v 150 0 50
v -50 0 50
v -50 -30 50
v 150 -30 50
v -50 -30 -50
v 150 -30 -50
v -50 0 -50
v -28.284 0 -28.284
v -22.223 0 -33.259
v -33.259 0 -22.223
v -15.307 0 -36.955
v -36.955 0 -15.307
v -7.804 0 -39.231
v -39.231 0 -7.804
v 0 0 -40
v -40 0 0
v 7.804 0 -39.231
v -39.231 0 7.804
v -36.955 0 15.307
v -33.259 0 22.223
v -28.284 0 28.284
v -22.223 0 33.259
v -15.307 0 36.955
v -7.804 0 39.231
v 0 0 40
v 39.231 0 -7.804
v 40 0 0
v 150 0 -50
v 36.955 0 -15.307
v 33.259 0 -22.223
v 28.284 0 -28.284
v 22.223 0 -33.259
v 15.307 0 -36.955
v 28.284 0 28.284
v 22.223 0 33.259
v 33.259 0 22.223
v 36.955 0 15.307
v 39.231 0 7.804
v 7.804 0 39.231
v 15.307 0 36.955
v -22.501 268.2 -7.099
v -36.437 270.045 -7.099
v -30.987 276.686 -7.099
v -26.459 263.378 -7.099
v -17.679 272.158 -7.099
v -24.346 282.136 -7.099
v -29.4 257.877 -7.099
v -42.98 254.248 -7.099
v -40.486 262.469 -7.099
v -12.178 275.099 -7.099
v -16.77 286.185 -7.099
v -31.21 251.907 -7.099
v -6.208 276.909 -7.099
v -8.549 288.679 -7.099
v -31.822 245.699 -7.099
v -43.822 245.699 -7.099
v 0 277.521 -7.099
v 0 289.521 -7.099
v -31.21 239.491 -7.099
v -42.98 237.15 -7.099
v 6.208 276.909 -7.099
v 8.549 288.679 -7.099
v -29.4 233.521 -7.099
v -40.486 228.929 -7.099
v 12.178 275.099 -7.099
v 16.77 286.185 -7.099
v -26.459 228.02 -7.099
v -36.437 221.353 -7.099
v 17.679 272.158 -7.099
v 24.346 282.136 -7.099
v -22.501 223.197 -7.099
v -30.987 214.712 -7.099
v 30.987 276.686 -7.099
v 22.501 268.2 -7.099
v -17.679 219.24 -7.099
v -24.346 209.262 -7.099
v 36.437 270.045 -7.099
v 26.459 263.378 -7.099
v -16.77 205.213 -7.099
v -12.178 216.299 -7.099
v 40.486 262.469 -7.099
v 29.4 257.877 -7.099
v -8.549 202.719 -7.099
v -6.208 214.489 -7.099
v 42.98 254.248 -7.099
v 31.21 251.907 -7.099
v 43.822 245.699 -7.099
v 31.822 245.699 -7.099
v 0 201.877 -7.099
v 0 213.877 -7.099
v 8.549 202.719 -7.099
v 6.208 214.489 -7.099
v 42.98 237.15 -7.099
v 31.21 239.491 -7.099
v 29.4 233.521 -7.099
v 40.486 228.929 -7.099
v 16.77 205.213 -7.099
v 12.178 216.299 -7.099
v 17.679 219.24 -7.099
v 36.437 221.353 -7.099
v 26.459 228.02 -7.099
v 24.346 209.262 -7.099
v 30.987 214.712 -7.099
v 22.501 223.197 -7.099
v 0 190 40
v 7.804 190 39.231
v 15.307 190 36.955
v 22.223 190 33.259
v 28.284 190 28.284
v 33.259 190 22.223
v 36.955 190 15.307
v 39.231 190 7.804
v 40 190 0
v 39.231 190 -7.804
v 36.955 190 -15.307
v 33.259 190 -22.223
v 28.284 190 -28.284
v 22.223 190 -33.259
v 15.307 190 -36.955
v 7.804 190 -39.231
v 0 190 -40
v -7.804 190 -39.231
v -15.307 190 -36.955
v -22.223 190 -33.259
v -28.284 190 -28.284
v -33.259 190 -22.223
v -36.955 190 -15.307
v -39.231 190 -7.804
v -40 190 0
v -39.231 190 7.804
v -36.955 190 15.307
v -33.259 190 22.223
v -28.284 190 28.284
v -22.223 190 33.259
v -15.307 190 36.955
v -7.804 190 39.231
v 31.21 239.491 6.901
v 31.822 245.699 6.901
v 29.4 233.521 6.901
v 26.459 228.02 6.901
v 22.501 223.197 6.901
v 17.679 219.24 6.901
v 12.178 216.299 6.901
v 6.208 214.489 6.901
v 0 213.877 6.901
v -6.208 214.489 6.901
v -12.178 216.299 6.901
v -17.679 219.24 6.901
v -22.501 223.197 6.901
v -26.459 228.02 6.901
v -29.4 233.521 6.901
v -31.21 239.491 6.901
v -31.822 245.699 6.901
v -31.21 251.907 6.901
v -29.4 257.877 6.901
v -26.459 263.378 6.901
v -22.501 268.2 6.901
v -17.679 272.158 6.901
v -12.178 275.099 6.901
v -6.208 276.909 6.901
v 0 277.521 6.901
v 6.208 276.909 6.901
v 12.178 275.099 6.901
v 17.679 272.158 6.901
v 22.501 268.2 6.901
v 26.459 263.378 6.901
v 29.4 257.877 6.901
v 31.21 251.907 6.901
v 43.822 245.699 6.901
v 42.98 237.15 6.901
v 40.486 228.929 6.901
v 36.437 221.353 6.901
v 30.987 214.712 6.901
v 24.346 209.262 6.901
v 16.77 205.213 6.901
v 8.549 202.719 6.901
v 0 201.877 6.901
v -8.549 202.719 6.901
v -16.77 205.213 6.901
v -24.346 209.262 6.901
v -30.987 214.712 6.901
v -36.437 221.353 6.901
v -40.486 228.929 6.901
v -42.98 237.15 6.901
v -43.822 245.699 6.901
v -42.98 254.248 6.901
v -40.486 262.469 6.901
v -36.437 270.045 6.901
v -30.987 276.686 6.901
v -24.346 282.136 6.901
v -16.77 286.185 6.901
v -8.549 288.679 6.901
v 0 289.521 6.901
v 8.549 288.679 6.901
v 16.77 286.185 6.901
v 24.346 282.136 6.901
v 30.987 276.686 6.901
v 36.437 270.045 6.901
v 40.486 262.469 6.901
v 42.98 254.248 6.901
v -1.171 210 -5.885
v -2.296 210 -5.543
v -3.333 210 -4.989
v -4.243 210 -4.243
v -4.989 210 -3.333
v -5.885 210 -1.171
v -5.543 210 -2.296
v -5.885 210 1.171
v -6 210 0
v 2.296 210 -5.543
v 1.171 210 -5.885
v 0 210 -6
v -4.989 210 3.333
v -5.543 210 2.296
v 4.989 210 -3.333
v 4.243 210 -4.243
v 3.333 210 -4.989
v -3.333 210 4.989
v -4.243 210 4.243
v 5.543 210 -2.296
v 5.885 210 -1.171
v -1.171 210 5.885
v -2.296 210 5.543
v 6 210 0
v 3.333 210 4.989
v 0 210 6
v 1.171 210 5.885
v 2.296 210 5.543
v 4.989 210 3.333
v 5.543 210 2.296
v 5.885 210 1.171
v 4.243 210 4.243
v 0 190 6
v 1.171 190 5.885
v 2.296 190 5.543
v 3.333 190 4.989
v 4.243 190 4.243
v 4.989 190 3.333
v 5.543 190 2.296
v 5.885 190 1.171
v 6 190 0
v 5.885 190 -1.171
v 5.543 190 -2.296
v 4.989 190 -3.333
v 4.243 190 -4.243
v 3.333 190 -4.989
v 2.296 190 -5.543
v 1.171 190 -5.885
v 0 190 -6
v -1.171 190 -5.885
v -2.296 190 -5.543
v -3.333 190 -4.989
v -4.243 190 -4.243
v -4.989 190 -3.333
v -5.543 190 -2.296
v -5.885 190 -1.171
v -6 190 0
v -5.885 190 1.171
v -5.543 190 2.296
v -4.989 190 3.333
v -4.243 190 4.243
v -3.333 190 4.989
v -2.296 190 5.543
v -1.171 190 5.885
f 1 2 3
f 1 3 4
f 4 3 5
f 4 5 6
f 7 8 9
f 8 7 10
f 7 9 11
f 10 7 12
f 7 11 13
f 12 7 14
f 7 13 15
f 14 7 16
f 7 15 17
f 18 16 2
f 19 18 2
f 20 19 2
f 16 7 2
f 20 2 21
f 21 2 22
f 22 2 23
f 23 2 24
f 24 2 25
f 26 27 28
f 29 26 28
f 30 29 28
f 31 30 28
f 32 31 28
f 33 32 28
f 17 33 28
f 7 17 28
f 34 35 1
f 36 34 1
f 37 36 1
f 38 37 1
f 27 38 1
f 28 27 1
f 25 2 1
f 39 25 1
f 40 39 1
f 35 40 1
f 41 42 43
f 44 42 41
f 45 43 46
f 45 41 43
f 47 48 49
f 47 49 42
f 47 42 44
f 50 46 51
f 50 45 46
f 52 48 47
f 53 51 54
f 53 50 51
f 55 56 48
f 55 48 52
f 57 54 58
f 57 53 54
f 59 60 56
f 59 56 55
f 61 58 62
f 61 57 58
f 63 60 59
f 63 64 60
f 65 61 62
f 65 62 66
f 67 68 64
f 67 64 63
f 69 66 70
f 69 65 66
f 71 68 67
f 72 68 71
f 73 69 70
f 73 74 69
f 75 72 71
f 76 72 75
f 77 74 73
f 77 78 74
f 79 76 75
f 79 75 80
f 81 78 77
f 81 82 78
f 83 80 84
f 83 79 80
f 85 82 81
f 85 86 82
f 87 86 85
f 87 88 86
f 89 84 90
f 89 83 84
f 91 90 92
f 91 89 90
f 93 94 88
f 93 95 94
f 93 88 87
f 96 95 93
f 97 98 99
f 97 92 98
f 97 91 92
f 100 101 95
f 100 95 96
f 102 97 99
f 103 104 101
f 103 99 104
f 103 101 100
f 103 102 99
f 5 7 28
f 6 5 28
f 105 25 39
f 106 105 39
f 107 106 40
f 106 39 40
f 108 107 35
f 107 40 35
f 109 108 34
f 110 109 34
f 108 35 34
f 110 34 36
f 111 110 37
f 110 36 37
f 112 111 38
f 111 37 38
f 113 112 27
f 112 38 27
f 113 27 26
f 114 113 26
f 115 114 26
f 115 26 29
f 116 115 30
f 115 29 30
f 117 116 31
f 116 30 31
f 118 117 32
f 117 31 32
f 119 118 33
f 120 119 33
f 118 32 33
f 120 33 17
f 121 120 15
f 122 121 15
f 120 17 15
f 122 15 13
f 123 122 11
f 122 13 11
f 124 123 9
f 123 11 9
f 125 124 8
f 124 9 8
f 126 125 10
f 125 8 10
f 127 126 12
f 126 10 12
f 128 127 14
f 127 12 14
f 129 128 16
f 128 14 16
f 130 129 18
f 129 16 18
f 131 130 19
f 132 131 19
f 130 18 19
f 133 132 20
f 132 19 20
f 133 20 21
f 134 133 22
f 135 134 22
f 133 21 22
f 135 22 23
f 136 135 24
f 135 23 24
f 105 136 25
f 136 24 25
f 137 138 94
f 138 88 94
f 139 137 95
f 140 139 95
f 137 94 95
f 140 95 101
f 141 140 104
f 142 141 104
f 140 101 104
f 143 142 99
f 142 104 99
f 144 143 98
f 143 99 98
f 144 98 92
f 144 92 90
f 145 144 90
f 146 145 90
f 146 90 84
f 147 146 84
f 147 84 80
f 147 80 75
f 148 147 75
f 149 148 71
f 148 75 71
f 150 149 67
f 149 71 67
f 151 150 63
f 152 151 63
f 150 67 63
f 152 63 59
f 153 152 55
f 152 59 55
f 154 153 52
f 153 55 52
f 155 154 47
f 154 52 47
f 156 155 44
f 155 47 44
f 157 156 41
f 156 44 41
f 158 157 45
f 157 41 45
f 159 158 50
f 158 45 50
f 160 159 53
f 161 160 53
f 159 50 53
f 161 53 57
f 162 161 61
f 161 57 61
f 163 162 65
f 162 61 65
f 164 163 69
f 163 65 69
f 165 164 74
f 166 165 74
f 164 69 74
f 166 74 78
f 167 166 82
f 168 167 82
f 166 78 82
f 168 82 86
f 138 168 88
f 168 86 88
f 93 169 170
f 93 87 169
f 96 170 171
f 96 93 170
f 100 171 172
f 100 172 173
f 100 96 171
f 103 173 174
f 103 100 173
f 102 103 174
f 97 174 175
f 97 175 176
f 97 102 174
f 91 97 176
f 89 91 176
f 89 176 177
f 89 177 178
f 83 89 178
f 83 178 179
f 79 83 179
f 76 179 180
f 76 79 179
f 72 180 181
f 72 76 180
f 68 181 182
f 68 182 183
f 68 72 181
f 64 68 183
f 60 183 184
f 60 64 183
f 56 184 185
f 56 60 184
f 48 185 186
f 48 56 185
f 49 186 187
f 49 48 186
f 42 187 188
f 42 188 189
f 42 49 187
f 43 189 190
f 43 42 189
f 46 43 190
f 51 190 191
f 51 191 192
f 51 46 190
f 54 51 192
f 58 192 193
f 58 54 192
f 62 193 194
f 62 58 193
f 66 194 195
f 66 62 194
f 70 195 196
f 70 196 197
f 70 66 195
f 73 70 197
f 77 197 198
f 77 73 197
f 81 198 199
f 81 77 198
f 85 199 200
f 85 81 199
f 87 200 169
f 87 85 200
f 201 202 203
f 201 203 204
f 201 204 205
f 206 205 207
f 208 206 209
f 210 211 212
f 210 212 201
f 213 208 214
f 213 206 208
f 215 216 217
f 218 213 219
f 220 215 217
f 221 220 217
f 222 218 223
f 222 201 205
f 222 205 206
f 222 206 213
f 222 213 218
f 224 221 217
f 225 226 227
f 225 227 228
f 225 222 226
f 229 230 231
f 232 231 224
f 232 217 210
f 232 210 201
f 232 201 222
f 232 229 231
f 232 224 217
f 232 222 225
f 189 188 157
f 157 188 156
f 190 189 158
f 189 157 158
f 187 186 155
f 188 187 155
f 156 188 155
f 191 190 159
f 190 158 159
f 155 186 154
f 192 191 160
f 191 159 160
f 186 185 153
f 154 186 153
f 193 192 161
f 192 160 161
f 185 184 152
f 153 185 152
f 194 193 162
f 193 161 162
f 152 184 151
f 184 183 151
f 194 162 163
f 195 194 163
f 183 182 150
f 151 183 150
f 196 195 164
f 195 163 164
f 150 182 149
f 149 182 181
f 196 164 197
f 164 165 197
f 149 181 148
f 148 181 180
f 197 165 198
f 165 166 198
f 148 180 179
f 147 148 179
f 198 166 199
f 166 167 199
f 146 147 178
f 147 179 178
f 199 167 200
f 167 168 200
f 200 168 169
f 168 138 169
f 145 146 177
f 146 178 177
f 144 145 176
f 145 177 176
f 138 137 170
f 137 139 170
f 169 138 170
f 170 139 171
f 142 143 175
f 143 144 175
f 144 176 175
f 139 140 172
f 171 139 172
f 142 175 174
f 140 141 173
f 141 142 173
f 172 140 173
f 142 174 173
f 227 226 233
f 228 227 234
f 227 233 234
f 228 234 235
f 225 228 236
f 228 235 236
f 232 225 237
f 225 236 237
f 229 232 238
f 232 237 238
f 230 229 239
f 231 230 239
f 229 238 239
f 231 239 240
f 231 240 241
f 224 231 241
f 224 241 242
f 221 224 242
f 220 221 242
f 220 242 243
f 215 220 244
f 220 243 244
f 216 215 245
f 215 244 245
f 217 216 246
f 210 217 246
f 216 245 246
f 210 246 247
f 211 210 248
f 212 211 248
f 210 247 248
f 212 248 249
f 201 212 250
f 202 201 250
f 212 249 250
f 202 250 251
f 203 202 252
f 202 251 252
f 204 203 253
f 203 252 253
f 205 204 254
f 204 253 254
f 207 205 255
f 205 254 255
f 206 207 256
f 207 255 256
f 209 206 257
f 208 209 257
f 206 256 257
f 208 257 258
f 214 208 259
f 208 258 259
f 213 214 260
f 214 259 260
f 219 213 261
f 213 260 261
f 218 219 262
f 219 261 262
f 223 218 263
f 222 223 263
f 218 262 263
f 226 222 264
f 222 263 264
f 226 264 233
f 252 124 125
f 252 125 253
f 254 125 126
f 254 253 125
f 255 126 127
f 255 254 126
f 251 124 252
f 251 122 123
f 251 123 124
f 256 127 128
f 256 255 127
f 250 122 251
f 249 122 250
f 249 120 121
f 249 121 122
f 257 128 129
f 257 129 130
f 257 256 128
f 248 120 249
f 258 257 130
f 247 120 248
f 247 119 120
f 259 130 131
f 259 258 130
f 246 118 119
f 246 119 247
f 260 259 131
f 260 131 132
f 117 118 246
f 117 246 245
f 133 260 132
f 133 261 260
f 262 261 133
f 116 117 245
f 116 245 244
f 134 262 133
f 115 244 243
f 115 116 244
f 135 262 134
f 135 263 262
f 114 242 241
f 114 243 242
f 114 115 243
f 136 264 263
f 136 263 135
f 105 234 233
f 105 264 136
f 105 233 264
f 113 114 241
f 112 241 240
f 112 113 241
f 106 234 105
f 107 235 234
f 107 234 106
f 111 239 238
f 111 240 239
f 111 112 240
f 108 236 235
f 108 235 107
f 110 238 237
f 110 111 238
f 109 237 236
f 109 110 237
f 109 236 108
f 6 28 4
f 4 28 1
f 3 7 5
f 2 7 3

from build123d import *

# Parameters (mm, degrees)
SKETCH1_R           = 40
BOSS_EXTRUDE1_DEPTH = 190
SKETCH3_W           = 200
SKETCH3_H           = 100
BOSS_EXTRUDE3_DEPTH = 30
SKETCH4_R           = 6
BOSS_EXTRUDE4_DEPTH = 20
SKETCH5_W           = 14
SKETCH5_H           = 12


with BuildPart() as part:
    # Sketch1 → Boss-Extrude1 (new body)
    with BuildSketch(Plane(origin=(0, 0, 0), x_dir=(1, 0, 0), z_dir=(0, 1, 0))):
        with Locations(Location((0, 0, 0), (0, 0, 270))):
            Circle(SKETCH1_R)
    extrude(amount=BOSS_EXTRUDE1_DEPTH)

    # Sketch3 → Boss-Extrude3 (add)
    with BuildSketch(Plane.XZ):
        with Locations((50, 0)):
            Rectangle(SKETCH3_W, SKETCH3_H)
    extrude(amount=BOSS_EXTRUDE3_DEPTH)

    # Sketch4 → Boss-Extrude4 (add)
    with BuildSketch(Plane(origin=(0, 190, 0), x_dir=(1, 0, 0), z_dir=(0, 1, 0))):
        with Locations(Location((0, 0, 0), (0, 0, 270))):
            Circle(SKETCH4_R)
    extrude(amount=BOSS_EXTRUDE4_DEPTH)


with BuildPart() as body_2:
    # Sketch5 → Revolve1 (revolve)
    with BuildSketch(Plane(origin=(0, 0, 0), x_dir=(0, 0, -1), z_dir=(1, 0, 0)), mode=Mode.PRIVATE) as revolve1_sk:
        with Locations((0.099371949, 207.877080342)):
            Rectangle(SKETCH5_W, SKETCH5_H)
    revolve(revolve1_sk.sketch.rotate(Axis((0, 245.698971078, 6), (0, 0, -1)), 270), axis=Axis((0, 245.698971078, 6), (0, 0, -1)))


solid = Compound([part.part, body_2.part])
